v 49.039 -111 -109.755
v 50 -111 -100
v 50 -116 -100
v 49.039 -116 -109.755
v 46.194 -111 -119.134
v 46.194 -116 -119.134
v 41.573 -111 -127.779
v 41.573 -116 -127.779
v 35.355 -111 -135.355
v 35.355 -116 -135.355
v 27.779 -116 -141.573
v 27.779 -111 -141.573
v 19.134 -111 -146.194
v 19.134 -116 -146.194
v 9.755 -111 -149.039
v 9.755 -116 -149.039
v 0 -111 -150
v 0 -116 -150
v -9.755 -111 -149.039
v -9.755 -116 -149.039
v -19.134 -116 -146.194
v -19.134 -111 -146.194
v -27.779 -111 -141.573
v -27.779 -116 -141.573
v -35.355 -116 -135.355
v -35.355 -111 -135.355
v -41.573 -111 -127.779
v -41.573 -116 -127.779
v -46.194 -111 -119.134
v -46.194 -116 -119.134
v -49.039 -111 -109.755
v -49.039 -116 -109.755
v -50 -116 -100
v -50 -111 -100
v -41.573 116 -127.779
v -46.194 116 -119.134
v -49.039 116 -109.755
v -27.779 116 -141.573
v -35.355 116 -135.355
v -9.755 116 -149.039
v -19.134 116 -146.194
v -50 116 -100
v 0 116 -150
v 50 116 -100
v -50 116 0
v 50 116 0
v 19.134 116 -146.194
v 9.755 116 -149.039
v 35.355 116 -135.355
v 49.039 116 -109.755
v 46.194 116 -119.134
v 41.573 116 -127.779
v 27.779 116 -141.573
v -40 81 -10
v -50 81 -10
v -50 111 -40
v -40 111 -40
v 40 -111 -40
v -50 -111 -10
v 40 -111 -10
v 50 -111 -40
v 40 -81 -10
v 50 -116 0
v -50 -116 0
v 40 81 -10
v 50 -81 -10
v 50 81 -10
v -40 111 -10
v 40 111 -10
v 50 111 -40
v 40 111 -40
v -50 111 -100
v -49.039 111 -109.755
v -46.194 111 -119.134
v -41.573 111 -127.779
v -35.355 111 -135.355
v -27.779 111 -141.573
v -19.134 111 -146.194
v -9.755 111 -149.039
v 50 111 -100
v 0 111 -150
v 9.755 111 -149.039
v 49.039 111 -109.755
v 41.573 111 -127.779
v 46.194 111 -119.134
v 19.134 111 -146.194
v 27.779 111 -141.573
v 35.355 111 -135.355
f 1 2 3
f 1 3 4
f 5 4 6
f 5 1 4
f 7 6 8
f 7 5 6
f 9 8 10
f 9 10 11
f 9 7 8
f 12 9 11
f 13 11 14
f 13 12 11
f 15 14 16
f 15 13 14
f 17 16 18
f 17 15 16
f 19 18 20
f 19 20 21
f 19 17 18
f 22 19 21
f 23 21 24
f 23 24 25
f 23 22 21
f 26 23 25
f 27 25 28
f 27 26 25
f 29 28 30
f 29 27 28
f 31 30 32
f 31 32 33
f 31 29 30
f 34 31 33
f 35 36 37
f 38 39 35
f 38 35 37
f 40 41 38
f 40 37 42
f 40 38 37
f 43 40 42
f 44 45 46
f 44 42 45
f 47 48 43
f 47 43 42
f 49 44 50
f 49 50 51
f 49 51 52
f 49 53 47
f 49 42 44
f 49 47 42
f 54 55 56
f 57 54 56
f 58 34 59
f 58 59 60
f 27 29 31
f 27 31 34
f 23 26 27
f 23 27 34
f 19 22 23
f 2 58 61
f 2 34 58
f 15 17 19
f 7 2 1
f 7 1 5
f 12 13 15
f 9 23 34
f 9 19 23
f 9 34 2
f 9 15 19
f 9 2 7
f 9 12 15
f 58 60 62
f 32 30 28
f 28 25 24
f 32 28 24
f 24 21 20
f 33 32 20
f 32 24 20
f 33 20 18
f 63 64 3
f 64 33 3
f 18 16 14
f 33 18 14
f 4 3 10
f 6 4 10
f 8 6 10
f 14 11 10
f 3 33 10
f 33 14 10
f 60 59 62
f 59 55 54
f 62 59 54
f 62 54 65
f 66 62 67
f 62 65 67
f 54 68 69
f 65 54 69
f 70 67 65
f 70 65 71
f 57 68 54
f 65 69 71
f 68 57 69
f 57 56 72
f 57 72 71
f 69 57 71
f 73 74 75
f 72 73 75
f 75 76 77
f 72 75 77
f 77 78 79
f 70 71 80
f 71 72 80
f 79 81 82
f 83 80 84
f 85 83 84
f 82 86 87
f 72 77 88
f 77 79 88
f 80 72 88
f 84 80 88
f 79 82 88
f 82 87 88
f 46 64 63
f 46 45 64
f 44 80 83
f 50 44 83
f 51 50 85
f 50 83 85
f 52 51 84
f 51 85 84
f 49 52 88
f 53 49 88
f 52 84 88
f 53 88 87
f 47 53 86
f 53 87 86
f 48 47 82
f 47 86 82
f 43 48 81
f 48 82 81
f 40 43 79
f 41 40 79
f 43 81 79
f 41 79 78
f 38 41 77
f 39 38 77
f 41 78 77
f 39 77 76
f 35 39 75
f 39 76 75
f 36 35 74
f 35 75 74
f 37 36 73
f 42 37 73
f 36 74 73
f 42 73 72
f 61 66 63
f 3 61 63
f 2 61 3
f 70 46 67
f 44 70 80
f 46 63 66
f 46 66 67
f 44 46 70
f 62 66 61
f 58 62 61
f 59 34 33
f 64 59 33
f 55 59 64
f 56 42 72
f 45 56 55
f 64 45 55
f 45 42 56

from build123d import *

# Parameters (mm, degrees)
PLATE_SKETCH_W                  = 100
PLATE_SKETCH_H                  = 222
PLATE_EXTRUDE_DEPTH             = 10
PRIMARY_SUPPORT_EXTRUDE_DEPTH   = 10
SECONDARY_SUPPORT_EXTRUDE_DEPTH = 10
GRIPPER_EXTRUDE_DEPTH           = 5


with BuildPart() as part:
    # Plate Sketch → Plate Extrude (new body)
    with BuildSketch(Plane.XY):
        Rectangle(PLATE_SKETCH_W, PLATE_SKETCH_H)
    extrude(amount=-PLATE_EXTRUDE_DEPTH)

    # Primary Support Sketch → Primary Support Extrude (add)
    with BuildSketch(Plane(origin=(50, 0, 0), x_dir=(0, 0, -1), z_dir=(1, 0, 0))):
        Polygon((10, 111), (10, 81), (40, 111), align=None)
    primary_support_extrude = extrude(amount=-PRIMARY_SUPPORT_EXTRUDE_DEPTH)

    # Primary Support Mirror: Primary Support Extrude across plane
    add(primary_support_extrude.mirror(Plane.ZX))

    # Secondary Support Sketch → Secondary Support Extrude (add)
    with BuildSketch(Plane.ZY.offset(50)):
        Polygon((-10, 81), (-40, 111), (-10, 111), align=None)
    extrude(amount=-SECONDARY_SUPPORT_EXTRUDE_DEPTH)

    # Gripper Sketch → Gripper Extrude (add)
    with BuildSketch(Plane(origin=(0, 111, 0), x_dir=(1, 0, 0), z_dir=(0, 1, 0))):
        with BuildLine():
            Line((-50, 0), (50, 0))
            Line((50, 0), (50, 100))
            ThreePointArc((50, 100), (0, 150), (-50, 100))
            Line((-50, 100), (-50, 0))
        make_face()
    gripper_extrude = extrude(amount=GRIPPER_EXTRUDE_DEPTH)

    # Gripper Mirror: Gripper Extrude across plane
    add(gripper_extrude.mirror(Plane.ZX))


solid = part.part
